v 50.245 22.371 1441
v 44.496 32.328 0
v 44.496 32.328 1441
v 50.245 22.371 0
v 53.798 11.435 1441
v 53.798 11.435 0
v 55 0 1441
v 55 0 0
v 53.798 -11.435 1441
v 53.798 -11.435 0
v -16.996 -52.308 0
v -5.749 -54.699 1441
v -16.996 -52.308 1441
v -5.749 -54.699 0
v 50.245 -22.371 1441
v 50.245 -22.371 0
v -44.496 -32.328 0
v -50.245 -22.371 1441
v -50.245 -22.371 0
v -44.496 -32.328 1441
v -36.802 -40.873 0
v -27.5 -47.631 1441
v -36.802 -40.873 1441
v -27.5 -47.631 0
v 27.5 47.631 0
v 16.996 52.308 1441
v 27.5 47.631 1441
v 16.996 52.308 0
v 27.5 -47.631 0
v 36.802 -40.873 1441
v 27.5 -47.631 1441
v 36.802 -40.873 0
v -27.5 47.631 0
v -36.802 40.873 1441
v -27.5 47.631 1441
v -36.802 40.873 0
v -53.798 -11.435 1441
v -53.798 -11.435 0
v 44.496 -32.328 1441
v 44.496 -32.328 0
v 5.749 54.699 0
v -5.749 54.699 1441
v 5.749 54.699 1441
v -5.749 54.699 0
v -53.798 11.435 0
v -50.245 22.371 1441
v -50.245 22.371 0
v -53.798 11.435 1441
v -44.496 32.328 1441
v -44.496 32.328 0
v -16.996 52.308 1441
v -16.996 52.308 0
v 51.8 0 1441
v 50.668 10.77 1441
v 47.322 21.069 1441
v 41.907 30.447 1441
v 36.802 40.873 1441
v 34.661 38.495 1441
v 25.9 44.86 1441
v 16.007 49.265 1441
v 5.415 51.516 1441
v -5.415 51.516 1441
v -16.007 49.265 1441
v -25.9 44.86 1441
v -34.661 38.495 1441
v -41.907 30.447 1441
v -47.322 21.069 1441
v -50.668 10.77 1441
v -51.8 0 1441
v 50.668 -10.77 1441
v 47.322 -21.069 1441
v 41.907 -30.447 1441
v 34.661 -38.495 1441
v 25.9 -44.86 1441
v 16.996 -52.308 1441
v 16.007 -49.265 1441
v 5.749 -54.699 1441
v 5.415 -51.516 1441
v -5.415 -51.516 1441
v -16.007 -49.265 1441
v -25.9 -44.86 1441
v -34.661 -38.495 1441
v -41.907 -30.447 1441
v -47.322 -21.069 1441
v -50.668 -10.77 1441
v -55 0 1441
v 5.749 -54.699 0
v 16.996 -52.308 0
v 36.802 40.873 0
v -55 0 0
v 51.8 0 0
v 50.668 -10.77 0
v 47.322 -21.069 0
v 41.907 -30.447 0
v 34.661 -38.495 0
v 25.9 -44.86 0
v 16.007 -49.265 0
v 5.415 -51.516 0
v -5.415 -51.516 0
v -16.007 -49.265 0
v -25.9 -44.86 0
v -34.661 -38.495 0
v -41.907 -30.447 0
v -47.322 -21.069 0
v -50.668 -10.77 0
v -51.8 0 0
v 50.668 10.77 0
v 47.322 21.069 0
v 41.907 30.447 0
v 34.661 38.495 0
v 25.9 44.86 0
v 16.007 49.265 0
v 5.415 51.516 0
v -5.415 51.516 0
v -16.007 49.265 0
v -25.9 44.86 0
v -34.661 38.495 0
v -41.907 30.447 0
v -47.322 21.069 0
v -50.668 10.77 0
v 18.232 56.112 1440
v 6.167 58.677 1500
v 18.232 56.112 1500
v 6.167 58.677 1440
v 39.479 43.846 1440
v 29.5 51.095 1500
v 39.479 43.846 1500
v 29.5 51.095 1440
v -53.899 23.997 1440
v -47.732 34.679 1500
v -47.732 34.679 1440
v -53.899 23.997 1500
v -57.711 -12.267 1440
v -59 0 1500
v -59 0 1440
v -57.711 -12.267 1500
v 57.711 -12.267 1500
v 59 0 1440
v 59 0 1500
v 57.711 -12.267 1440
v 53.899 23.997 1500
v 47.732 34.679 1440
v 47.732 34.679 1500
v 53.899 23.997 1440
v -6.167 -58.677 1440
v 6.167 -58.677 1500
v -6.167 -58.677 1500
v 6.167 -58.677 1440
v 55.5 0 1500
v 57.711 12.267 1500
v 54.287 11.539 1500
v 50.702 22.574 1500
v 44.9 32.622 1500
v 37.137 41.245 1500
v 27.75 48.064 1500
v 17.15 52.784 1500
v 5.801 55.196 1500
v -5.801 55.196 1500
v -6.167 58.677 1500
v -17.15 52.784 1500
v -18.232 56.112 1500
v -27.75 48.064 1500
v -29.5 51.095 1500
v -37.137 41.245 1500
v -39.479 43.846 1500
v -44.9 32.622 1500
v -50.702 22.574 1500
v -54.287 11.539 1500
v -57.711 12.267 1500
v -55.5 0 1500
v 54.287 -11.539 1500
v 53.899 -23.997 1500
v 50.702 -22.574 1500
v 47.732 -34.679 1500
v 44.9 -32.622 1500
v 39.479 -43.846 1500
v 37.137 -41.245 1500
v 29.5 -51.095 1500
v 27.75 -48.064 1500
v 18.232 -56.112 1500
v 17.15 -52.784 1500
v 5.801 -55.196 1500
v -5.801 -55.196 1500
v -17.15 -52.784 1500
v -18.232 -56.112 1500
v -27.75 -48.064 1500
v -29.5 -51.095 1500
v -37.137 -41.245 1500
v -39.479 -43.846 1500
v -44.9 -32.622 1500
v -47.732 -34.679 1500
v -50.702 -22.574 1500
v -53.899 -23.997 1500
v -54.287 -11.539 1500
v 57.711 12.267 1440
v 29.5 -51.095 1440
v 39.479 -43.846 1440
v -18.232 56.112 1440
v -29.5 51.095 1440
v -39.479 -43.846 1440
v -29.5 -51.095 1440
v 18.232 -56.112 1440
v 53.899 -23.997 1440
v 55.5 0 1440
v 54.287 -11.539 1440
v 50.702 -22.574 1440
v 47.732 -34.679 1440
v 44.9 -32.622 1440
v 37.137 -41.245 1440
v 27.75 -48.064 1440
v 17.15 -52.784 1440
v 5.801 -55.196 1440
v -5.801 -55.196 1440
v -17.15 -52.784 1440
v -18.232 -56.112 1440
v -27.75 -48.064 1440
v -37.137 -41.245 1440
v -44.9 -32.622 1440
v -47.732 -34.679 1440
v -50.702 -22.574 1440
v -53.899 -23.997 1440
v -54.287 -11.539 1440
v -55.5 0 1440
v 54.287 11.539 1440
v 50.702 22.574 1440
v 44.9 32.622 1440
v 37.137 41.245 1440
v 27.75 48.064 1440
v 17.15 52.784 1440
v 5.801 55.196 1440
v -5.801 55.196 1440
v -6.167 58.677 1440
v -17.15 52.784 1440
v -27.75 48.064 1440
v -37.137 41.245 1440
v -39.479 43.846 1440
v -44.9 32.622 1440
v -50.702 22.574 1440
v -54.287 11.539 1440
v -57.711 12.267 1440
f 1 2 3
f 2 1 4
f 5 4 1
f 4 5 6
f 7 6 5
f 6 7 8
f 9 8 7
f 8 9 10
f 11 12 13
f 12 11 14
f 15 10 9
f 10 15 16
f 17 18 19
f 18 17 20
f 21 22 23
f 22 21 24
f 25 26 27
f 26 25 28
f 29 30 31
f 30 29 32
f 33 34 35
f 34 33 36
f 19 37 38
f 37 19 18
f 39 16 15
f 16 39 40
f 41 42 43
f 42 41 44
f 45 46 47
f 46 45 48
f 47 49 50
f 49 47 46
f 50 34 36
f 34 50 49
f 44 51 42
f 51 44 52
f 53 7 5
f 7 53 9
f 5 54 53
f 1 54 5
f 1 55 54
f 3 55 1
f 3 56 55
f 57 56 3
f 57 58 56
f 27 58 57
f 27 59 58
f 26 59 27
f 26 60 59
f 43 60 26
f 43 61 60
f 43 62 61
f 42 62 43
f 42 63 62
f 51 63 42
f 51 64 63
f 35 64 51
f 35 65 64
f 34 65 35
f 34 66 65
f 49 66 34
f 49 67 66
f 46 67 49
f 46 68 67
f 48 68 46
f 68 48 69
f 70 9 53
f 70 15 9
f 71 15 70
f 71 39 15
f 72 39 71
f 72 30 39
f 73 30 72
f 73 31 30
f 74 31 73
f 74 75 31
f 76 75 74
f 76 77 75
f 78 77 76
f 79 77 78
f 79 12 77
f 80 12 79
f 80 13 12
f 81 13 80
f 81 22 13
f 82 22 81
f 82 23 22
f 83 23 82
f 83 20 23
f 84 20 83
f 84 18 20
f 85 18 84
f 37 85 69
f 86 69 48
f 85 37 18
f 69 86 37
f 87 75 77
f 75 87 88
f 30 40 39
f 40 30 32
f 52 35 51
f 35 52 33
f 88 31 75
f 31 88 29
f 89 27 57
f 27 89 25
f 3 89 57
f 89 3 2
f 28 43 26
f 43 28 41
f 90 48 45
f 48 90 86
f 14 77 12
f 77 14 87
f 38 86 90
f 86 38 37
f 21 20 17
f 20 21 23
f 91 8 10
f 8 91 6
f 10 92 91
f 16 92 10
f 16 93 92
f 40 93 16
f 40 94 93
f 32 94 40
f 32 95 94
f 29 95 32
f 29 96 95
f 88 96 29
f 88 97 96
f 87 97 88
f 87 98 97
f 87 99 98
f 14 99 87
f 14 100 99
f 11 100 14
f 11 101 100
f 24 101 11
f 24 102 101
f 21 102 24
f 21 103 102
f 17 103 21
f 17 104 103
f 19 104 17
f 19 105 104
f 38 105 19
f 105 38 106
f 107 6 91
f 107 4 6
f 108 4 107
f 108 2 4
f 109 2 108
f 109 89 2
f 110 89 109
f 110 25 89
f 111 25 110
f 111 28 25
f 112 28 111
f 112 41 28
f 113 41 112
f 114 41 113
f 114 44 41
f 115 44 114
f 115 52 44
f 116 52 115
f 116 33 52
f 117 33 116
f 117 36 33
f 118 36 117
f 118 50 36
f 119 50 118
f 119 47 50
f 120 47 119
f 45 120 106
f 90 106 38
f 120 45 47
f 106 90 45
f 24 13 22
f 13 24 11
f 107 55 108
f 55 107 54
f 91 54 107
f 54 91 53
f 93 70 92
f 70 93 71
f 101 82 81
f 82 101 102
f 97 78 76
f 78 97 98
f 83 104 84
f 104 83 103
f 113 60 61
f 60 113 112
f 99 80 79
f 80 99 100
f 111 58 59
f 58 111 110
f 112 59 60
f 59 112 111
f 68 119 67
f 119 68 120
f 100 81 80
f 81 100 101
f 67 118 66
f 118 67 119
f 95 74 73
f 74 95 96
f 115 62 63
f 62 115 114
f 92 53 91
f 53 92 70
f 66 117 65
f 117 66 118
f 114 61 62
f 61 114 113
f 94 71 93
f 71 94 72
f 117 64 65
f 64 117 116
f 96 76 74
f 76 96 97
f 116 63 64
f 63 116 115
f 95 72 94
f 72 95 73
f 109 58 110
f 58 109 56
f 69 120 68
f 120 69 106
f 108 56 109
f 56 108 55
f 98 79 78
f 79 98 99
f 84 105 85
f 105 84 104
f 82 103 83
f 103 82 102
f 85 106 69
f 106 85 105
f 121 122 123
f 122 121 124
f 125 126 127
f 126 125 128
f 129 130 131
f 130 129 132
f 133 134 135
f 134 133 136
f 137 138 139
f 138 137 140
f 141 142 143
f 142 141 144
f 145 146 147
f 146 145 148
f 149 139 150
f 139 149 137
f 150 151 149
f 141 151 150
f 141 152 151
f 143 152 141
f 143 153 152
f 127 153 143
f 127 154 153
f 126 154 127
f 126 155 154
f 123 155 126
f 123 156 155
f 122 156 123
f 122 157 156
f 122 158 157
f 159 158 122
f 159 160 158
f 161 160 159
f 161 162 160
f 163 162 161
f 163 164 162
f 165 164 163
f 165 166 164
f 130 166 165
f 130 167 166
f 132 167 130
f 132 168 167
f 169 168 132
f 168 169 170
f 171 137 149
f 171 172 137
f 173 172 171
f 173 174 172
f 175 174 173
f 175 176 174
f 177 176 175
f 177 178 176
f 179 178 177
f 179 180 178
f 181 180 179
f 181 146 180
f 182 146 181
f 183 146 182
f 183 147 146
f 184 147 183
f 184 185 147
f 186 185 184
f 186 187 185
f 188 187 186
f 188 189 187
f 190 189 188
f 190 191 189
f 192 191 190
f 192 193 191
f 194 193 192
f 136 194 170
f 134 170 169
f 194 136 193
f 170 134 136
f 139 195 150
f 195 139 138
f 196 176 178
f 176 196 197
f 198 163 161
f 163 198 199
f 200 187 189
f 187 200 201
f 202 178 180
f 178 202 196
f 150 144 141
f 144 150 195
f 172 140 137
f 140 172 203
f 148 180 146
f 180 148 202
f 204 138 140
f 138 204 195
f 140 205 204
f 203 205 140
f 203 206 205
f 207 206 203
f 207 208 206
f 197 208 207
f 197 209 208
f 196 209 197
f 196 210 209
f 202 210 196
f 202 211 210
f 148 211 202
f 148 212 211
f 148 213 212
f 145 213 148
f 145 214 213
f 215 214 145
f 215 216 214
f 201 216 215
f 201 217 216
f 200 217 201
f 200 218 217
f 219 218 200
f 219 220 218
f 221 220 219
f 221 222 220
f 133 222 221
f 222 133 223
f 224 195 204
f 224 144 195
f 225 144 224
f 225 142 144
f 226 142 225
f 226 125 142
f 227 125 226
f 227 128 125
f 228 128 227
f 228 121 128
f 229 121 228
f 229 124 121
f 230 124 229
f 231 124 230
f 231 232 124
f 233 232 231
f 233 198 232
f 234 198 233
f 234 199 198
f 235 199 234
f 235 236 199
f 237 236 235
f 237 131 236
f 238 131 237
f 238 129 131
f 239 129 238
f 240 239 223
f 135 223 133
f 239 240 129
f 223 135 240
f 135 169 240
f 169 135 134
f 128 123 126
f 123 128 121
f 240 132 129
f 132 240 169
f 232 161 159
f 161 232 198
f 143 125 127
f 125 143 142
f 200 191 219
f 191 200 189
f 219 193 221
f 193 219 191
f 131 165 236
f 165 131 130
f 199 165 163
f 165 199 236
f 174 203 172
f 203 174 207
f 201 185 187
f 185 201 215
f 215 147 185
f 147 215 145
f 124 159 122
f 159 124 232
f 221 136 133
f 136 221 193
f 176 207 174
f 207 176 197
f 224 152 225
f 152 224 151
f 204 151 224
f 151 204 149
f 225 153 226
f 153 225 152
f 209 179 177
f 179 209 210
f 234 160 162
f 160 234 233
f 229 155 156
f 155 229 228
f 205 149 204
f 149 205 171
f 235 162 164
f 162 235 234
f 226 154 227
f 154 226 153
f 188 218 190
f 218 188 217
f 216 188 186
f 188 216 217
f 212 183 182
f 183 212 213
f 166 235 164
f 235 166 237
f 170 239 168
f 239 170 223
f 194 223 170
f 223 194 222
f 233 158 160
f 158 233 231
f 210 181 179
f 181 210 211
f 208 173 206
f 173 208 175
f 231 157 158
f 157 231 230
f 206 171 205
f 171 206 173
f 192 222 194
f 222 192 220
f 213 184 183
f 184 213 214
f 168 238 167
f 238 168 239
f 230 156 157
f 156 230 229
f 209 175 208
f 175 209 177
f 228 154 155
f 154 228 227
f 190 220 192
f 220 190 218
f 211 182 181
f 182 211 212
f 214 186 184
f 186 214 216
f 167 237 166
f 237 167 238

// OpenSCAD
// Parameters
nominal_diameter_mm = 110; //[50:220:1]
length_mm = 1500; //[750:3000:10]
pipe_od = 110; //[55:220:1]
pipe_wall = 3.2; //[1.6:6.4:0.1]
fitting_socket_length = 60; //[30:120:1]
fitting_socket_wall = 4.0; //[2.0:8.0:0.1]
fitting_overlap = 1.0; //[0.5:2.0:0.1]
inner_clearance = 0.5; //[0.0:1.5:0.1]

// Ht Pipe - complete geometry
module ht_pipe() {
  color([0.85, 0.85, 0.8]) { // PVC color
    union() {
      // Pipe body
      difference() {
        cylinder(h=length_mm - fitting_socket_length + fitting_overlap, r=pipe_od/2, center=false);
        translate([0, 0, 0])
          cylinder(h=length_mm - fitting_socket_length + fitting_overlap, r=pipe_od/2 - pipe_wall, center=false);
      }
      // Integrated end fitting
      difference() {
        translate([0, 0, length_mm - fitting_socket_length])
          cylinder(h=fitting_socket_length, r=pipe_od/2 + fitting_socket_wall, center=false);
        translate([0, 0, length_mm - fitting_socket_length])
          cylinder(h=fitting_socket_length, r=pipe_od/2 + inner_clearance, center=false);
      }
    }
  }
}

// Assembly
module assembly() {
  ht_pipe();
}

assembly();
